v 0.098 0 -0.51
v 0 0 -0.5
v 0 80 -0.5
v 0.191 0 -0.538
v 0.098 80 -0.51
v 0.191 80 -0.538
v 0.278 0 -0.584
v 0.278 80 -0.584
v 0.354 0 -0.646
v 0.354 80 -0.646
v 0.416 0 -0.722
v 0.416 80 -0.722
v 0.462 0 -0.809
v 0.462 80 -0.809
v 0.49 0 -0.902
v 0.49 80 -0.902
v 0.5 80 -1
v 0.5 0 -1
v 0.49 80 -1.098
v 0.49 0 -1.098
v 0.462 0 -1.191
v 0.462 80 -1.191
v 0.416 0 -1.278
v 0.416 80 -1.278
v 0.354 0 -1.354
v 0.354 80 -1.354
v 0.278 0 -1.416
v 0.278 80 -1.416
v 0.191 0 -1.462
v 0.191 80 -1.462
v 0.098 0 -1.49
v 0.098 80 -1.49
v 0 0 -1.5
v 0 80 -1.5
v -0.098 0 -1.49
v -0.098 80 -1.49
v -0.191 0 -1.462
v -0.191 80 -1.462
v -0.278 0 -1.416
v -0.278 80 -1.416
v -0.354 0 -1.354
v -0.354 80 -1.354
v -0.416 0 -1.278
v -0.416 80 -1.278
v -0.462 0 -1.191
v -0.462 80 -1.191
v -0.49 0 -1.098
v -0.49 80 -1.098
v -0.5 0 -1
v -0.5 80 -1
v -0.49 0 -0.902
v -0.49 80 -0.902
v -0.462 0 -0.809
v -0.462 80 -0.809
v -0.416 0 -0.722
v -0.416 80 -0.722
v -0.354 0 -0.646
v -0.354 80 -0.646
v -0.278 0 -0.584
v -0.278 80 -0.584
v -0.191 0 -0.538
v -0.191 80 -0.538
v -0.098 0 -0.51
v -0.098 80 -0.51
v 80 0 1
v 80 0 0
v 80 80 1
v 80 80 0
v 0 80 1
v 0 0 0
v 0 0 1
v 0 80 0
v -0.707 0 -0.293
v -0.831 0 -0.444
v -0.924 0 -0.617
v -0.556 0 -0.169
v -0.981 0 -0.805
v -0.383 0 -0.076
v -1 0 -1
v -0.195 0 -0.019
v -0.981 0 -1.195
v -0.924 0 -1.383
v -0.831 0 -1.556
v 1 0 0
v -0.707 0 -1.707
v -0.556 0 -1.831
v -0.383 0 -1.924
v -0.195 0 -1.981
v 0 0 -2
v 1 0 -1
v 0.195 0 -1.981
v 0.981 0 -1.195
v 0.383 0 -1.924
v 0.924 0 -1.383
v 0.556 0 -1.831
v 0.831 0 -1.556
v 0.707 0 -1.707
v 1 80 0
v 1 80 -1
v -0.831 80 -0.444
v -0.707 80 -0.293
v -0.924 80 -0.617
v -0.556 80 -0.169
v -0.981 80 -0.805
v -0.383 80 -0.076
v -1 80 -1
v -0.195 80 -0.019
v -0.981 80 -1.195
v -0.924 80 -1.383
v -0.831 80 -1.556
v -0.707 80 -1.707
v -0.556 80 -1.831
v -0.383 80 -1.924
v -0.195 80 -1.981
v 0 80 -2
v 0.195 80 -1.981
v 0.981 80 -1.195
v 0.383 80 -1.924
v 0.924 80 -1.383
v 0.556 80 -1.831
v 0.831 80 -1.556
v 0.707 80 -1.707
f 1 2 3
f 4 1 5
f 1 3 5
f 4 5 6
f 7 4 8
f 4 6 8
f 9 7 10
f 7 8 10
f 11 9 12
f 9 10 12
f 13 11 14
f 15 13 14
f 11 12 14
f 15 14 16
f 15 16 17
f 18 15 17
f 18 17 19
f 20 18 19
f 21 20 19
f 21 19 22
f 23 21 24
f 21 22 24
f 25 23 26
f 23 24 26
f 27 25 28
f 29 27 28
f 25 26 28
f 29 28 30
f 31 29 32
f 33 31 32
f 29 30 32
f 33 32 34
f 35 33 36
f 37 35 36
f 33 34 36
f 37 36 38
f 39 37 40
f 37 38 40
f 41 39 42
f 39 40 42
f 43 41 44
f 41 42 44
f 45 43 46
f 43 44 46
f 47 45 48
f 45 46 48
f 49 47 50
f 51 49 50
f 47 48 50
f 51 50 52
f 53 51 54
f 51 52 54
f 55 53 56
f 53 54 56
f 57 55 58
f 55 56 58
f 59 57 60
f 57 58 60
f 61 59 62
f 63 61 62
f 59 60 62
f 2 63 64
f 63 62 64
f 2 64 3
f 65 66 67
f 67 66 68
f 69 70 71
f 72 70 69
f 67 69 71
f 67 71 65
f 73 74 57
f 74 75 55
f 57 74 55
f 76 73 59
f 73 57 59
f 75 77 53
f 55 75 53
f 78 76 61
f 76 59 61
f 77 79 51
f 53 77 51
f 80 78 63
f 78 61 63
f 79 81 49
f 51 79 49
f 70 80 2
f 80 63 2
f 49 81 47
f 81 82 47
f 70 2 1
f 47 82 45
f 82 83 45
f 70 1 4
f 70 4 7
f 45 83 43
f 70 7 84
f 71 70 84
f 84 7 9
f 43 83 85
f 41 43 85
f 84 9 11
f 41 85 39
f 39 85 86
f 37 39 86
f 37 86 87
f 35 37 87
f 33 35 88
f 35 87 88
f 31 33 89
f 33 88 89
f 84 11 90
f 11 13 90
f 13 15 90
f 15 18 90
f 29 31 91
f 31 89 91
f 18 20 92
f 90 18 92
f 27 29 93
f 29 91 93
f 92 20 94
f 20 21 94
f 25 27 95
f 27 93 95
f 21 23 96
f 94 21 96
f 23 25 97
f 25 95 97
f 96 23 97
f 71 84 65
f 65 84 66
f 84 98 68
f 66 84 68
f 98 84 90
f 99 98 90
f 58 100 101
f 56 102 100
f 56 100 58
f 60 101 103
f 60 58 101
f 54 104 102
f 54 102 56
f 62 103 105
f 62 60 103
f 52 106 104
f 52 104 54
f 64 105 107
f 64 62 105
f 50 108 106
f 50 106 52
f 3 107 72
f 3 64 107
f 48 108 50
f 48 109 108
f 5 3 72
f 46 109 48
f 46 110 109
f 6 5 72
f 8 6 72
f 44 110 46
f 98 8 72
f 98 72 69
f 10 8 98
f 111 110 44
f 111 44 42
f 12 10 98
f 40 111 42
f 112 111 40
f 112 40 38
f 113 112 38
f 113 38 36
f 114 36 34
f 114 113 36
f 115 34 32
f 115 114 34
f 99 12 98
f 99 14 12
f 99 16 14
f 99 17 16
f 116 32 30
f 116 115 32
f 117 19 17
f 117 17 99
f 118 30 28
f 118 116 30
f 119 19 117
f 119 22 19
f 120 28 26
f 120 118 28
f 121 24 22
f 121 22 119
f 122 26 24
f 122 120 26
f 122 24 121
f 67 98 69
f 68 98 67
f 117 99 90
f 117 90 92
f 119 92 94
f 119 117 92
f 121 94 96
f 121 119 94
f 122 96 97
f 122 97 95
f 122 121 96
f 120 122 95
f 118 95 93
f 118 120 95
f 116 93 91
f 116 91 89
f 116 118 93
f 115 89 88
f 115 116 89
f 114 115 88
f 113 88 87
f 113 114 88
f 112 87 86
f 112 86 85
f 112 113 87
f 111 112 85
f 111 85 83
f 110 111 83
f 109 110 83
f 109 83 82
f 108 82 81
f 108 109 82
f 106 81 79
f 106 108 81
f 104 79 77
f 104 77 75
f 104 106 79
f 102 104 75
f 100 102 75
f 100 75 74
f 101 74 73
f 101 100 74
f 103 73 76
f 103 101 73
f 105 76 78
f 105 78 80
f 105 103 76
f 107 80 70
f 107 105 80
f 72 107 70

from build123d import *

# Parameters (mm, degrees)
ESQUISSE1_W        = 80
ESQUISSE1_H        = 80
BOSS_EXTRU_1_DEPTH = 1
ESQUISSE2_R        = 0.5
BOSS_EXTRU_2_DEPTH = 80


with BuildPart() as part:
    # Esquisse1 → Boss.-Extru.1 (new body)
    with BuildSketch(Plane.XY):
        with Locations((40, 40)):
            Rectangle(ESQUISSE1_W, ESQUISSE1_H)
    extrude(amount=BOSS_EXTRU_1_DEPTH)

    # Esquisse2 → Boss.-Extru.2 (add)
    with BuildSketch(Plane(origin=(0, 80, 0), x_dir=(1, 0, 0), z_dir=(0, 1, 0))):
        with BuildLine():
            Line((1, 0), (1, 1))
            ThreePointArc((1, 1), (-0.707106781, 1.707106781), (0, 0))
            Line((0, 0), (1, 0))
        make_face()
        with Locations(Location((0, 1, 0), (0, 0, 270))):
            Circle(ESQUISSE2_R, mode=Mode.SUBTRACT)
    extrude(amount=-BOSS_EXTRU_2_DEPTH)


solid = part.part
